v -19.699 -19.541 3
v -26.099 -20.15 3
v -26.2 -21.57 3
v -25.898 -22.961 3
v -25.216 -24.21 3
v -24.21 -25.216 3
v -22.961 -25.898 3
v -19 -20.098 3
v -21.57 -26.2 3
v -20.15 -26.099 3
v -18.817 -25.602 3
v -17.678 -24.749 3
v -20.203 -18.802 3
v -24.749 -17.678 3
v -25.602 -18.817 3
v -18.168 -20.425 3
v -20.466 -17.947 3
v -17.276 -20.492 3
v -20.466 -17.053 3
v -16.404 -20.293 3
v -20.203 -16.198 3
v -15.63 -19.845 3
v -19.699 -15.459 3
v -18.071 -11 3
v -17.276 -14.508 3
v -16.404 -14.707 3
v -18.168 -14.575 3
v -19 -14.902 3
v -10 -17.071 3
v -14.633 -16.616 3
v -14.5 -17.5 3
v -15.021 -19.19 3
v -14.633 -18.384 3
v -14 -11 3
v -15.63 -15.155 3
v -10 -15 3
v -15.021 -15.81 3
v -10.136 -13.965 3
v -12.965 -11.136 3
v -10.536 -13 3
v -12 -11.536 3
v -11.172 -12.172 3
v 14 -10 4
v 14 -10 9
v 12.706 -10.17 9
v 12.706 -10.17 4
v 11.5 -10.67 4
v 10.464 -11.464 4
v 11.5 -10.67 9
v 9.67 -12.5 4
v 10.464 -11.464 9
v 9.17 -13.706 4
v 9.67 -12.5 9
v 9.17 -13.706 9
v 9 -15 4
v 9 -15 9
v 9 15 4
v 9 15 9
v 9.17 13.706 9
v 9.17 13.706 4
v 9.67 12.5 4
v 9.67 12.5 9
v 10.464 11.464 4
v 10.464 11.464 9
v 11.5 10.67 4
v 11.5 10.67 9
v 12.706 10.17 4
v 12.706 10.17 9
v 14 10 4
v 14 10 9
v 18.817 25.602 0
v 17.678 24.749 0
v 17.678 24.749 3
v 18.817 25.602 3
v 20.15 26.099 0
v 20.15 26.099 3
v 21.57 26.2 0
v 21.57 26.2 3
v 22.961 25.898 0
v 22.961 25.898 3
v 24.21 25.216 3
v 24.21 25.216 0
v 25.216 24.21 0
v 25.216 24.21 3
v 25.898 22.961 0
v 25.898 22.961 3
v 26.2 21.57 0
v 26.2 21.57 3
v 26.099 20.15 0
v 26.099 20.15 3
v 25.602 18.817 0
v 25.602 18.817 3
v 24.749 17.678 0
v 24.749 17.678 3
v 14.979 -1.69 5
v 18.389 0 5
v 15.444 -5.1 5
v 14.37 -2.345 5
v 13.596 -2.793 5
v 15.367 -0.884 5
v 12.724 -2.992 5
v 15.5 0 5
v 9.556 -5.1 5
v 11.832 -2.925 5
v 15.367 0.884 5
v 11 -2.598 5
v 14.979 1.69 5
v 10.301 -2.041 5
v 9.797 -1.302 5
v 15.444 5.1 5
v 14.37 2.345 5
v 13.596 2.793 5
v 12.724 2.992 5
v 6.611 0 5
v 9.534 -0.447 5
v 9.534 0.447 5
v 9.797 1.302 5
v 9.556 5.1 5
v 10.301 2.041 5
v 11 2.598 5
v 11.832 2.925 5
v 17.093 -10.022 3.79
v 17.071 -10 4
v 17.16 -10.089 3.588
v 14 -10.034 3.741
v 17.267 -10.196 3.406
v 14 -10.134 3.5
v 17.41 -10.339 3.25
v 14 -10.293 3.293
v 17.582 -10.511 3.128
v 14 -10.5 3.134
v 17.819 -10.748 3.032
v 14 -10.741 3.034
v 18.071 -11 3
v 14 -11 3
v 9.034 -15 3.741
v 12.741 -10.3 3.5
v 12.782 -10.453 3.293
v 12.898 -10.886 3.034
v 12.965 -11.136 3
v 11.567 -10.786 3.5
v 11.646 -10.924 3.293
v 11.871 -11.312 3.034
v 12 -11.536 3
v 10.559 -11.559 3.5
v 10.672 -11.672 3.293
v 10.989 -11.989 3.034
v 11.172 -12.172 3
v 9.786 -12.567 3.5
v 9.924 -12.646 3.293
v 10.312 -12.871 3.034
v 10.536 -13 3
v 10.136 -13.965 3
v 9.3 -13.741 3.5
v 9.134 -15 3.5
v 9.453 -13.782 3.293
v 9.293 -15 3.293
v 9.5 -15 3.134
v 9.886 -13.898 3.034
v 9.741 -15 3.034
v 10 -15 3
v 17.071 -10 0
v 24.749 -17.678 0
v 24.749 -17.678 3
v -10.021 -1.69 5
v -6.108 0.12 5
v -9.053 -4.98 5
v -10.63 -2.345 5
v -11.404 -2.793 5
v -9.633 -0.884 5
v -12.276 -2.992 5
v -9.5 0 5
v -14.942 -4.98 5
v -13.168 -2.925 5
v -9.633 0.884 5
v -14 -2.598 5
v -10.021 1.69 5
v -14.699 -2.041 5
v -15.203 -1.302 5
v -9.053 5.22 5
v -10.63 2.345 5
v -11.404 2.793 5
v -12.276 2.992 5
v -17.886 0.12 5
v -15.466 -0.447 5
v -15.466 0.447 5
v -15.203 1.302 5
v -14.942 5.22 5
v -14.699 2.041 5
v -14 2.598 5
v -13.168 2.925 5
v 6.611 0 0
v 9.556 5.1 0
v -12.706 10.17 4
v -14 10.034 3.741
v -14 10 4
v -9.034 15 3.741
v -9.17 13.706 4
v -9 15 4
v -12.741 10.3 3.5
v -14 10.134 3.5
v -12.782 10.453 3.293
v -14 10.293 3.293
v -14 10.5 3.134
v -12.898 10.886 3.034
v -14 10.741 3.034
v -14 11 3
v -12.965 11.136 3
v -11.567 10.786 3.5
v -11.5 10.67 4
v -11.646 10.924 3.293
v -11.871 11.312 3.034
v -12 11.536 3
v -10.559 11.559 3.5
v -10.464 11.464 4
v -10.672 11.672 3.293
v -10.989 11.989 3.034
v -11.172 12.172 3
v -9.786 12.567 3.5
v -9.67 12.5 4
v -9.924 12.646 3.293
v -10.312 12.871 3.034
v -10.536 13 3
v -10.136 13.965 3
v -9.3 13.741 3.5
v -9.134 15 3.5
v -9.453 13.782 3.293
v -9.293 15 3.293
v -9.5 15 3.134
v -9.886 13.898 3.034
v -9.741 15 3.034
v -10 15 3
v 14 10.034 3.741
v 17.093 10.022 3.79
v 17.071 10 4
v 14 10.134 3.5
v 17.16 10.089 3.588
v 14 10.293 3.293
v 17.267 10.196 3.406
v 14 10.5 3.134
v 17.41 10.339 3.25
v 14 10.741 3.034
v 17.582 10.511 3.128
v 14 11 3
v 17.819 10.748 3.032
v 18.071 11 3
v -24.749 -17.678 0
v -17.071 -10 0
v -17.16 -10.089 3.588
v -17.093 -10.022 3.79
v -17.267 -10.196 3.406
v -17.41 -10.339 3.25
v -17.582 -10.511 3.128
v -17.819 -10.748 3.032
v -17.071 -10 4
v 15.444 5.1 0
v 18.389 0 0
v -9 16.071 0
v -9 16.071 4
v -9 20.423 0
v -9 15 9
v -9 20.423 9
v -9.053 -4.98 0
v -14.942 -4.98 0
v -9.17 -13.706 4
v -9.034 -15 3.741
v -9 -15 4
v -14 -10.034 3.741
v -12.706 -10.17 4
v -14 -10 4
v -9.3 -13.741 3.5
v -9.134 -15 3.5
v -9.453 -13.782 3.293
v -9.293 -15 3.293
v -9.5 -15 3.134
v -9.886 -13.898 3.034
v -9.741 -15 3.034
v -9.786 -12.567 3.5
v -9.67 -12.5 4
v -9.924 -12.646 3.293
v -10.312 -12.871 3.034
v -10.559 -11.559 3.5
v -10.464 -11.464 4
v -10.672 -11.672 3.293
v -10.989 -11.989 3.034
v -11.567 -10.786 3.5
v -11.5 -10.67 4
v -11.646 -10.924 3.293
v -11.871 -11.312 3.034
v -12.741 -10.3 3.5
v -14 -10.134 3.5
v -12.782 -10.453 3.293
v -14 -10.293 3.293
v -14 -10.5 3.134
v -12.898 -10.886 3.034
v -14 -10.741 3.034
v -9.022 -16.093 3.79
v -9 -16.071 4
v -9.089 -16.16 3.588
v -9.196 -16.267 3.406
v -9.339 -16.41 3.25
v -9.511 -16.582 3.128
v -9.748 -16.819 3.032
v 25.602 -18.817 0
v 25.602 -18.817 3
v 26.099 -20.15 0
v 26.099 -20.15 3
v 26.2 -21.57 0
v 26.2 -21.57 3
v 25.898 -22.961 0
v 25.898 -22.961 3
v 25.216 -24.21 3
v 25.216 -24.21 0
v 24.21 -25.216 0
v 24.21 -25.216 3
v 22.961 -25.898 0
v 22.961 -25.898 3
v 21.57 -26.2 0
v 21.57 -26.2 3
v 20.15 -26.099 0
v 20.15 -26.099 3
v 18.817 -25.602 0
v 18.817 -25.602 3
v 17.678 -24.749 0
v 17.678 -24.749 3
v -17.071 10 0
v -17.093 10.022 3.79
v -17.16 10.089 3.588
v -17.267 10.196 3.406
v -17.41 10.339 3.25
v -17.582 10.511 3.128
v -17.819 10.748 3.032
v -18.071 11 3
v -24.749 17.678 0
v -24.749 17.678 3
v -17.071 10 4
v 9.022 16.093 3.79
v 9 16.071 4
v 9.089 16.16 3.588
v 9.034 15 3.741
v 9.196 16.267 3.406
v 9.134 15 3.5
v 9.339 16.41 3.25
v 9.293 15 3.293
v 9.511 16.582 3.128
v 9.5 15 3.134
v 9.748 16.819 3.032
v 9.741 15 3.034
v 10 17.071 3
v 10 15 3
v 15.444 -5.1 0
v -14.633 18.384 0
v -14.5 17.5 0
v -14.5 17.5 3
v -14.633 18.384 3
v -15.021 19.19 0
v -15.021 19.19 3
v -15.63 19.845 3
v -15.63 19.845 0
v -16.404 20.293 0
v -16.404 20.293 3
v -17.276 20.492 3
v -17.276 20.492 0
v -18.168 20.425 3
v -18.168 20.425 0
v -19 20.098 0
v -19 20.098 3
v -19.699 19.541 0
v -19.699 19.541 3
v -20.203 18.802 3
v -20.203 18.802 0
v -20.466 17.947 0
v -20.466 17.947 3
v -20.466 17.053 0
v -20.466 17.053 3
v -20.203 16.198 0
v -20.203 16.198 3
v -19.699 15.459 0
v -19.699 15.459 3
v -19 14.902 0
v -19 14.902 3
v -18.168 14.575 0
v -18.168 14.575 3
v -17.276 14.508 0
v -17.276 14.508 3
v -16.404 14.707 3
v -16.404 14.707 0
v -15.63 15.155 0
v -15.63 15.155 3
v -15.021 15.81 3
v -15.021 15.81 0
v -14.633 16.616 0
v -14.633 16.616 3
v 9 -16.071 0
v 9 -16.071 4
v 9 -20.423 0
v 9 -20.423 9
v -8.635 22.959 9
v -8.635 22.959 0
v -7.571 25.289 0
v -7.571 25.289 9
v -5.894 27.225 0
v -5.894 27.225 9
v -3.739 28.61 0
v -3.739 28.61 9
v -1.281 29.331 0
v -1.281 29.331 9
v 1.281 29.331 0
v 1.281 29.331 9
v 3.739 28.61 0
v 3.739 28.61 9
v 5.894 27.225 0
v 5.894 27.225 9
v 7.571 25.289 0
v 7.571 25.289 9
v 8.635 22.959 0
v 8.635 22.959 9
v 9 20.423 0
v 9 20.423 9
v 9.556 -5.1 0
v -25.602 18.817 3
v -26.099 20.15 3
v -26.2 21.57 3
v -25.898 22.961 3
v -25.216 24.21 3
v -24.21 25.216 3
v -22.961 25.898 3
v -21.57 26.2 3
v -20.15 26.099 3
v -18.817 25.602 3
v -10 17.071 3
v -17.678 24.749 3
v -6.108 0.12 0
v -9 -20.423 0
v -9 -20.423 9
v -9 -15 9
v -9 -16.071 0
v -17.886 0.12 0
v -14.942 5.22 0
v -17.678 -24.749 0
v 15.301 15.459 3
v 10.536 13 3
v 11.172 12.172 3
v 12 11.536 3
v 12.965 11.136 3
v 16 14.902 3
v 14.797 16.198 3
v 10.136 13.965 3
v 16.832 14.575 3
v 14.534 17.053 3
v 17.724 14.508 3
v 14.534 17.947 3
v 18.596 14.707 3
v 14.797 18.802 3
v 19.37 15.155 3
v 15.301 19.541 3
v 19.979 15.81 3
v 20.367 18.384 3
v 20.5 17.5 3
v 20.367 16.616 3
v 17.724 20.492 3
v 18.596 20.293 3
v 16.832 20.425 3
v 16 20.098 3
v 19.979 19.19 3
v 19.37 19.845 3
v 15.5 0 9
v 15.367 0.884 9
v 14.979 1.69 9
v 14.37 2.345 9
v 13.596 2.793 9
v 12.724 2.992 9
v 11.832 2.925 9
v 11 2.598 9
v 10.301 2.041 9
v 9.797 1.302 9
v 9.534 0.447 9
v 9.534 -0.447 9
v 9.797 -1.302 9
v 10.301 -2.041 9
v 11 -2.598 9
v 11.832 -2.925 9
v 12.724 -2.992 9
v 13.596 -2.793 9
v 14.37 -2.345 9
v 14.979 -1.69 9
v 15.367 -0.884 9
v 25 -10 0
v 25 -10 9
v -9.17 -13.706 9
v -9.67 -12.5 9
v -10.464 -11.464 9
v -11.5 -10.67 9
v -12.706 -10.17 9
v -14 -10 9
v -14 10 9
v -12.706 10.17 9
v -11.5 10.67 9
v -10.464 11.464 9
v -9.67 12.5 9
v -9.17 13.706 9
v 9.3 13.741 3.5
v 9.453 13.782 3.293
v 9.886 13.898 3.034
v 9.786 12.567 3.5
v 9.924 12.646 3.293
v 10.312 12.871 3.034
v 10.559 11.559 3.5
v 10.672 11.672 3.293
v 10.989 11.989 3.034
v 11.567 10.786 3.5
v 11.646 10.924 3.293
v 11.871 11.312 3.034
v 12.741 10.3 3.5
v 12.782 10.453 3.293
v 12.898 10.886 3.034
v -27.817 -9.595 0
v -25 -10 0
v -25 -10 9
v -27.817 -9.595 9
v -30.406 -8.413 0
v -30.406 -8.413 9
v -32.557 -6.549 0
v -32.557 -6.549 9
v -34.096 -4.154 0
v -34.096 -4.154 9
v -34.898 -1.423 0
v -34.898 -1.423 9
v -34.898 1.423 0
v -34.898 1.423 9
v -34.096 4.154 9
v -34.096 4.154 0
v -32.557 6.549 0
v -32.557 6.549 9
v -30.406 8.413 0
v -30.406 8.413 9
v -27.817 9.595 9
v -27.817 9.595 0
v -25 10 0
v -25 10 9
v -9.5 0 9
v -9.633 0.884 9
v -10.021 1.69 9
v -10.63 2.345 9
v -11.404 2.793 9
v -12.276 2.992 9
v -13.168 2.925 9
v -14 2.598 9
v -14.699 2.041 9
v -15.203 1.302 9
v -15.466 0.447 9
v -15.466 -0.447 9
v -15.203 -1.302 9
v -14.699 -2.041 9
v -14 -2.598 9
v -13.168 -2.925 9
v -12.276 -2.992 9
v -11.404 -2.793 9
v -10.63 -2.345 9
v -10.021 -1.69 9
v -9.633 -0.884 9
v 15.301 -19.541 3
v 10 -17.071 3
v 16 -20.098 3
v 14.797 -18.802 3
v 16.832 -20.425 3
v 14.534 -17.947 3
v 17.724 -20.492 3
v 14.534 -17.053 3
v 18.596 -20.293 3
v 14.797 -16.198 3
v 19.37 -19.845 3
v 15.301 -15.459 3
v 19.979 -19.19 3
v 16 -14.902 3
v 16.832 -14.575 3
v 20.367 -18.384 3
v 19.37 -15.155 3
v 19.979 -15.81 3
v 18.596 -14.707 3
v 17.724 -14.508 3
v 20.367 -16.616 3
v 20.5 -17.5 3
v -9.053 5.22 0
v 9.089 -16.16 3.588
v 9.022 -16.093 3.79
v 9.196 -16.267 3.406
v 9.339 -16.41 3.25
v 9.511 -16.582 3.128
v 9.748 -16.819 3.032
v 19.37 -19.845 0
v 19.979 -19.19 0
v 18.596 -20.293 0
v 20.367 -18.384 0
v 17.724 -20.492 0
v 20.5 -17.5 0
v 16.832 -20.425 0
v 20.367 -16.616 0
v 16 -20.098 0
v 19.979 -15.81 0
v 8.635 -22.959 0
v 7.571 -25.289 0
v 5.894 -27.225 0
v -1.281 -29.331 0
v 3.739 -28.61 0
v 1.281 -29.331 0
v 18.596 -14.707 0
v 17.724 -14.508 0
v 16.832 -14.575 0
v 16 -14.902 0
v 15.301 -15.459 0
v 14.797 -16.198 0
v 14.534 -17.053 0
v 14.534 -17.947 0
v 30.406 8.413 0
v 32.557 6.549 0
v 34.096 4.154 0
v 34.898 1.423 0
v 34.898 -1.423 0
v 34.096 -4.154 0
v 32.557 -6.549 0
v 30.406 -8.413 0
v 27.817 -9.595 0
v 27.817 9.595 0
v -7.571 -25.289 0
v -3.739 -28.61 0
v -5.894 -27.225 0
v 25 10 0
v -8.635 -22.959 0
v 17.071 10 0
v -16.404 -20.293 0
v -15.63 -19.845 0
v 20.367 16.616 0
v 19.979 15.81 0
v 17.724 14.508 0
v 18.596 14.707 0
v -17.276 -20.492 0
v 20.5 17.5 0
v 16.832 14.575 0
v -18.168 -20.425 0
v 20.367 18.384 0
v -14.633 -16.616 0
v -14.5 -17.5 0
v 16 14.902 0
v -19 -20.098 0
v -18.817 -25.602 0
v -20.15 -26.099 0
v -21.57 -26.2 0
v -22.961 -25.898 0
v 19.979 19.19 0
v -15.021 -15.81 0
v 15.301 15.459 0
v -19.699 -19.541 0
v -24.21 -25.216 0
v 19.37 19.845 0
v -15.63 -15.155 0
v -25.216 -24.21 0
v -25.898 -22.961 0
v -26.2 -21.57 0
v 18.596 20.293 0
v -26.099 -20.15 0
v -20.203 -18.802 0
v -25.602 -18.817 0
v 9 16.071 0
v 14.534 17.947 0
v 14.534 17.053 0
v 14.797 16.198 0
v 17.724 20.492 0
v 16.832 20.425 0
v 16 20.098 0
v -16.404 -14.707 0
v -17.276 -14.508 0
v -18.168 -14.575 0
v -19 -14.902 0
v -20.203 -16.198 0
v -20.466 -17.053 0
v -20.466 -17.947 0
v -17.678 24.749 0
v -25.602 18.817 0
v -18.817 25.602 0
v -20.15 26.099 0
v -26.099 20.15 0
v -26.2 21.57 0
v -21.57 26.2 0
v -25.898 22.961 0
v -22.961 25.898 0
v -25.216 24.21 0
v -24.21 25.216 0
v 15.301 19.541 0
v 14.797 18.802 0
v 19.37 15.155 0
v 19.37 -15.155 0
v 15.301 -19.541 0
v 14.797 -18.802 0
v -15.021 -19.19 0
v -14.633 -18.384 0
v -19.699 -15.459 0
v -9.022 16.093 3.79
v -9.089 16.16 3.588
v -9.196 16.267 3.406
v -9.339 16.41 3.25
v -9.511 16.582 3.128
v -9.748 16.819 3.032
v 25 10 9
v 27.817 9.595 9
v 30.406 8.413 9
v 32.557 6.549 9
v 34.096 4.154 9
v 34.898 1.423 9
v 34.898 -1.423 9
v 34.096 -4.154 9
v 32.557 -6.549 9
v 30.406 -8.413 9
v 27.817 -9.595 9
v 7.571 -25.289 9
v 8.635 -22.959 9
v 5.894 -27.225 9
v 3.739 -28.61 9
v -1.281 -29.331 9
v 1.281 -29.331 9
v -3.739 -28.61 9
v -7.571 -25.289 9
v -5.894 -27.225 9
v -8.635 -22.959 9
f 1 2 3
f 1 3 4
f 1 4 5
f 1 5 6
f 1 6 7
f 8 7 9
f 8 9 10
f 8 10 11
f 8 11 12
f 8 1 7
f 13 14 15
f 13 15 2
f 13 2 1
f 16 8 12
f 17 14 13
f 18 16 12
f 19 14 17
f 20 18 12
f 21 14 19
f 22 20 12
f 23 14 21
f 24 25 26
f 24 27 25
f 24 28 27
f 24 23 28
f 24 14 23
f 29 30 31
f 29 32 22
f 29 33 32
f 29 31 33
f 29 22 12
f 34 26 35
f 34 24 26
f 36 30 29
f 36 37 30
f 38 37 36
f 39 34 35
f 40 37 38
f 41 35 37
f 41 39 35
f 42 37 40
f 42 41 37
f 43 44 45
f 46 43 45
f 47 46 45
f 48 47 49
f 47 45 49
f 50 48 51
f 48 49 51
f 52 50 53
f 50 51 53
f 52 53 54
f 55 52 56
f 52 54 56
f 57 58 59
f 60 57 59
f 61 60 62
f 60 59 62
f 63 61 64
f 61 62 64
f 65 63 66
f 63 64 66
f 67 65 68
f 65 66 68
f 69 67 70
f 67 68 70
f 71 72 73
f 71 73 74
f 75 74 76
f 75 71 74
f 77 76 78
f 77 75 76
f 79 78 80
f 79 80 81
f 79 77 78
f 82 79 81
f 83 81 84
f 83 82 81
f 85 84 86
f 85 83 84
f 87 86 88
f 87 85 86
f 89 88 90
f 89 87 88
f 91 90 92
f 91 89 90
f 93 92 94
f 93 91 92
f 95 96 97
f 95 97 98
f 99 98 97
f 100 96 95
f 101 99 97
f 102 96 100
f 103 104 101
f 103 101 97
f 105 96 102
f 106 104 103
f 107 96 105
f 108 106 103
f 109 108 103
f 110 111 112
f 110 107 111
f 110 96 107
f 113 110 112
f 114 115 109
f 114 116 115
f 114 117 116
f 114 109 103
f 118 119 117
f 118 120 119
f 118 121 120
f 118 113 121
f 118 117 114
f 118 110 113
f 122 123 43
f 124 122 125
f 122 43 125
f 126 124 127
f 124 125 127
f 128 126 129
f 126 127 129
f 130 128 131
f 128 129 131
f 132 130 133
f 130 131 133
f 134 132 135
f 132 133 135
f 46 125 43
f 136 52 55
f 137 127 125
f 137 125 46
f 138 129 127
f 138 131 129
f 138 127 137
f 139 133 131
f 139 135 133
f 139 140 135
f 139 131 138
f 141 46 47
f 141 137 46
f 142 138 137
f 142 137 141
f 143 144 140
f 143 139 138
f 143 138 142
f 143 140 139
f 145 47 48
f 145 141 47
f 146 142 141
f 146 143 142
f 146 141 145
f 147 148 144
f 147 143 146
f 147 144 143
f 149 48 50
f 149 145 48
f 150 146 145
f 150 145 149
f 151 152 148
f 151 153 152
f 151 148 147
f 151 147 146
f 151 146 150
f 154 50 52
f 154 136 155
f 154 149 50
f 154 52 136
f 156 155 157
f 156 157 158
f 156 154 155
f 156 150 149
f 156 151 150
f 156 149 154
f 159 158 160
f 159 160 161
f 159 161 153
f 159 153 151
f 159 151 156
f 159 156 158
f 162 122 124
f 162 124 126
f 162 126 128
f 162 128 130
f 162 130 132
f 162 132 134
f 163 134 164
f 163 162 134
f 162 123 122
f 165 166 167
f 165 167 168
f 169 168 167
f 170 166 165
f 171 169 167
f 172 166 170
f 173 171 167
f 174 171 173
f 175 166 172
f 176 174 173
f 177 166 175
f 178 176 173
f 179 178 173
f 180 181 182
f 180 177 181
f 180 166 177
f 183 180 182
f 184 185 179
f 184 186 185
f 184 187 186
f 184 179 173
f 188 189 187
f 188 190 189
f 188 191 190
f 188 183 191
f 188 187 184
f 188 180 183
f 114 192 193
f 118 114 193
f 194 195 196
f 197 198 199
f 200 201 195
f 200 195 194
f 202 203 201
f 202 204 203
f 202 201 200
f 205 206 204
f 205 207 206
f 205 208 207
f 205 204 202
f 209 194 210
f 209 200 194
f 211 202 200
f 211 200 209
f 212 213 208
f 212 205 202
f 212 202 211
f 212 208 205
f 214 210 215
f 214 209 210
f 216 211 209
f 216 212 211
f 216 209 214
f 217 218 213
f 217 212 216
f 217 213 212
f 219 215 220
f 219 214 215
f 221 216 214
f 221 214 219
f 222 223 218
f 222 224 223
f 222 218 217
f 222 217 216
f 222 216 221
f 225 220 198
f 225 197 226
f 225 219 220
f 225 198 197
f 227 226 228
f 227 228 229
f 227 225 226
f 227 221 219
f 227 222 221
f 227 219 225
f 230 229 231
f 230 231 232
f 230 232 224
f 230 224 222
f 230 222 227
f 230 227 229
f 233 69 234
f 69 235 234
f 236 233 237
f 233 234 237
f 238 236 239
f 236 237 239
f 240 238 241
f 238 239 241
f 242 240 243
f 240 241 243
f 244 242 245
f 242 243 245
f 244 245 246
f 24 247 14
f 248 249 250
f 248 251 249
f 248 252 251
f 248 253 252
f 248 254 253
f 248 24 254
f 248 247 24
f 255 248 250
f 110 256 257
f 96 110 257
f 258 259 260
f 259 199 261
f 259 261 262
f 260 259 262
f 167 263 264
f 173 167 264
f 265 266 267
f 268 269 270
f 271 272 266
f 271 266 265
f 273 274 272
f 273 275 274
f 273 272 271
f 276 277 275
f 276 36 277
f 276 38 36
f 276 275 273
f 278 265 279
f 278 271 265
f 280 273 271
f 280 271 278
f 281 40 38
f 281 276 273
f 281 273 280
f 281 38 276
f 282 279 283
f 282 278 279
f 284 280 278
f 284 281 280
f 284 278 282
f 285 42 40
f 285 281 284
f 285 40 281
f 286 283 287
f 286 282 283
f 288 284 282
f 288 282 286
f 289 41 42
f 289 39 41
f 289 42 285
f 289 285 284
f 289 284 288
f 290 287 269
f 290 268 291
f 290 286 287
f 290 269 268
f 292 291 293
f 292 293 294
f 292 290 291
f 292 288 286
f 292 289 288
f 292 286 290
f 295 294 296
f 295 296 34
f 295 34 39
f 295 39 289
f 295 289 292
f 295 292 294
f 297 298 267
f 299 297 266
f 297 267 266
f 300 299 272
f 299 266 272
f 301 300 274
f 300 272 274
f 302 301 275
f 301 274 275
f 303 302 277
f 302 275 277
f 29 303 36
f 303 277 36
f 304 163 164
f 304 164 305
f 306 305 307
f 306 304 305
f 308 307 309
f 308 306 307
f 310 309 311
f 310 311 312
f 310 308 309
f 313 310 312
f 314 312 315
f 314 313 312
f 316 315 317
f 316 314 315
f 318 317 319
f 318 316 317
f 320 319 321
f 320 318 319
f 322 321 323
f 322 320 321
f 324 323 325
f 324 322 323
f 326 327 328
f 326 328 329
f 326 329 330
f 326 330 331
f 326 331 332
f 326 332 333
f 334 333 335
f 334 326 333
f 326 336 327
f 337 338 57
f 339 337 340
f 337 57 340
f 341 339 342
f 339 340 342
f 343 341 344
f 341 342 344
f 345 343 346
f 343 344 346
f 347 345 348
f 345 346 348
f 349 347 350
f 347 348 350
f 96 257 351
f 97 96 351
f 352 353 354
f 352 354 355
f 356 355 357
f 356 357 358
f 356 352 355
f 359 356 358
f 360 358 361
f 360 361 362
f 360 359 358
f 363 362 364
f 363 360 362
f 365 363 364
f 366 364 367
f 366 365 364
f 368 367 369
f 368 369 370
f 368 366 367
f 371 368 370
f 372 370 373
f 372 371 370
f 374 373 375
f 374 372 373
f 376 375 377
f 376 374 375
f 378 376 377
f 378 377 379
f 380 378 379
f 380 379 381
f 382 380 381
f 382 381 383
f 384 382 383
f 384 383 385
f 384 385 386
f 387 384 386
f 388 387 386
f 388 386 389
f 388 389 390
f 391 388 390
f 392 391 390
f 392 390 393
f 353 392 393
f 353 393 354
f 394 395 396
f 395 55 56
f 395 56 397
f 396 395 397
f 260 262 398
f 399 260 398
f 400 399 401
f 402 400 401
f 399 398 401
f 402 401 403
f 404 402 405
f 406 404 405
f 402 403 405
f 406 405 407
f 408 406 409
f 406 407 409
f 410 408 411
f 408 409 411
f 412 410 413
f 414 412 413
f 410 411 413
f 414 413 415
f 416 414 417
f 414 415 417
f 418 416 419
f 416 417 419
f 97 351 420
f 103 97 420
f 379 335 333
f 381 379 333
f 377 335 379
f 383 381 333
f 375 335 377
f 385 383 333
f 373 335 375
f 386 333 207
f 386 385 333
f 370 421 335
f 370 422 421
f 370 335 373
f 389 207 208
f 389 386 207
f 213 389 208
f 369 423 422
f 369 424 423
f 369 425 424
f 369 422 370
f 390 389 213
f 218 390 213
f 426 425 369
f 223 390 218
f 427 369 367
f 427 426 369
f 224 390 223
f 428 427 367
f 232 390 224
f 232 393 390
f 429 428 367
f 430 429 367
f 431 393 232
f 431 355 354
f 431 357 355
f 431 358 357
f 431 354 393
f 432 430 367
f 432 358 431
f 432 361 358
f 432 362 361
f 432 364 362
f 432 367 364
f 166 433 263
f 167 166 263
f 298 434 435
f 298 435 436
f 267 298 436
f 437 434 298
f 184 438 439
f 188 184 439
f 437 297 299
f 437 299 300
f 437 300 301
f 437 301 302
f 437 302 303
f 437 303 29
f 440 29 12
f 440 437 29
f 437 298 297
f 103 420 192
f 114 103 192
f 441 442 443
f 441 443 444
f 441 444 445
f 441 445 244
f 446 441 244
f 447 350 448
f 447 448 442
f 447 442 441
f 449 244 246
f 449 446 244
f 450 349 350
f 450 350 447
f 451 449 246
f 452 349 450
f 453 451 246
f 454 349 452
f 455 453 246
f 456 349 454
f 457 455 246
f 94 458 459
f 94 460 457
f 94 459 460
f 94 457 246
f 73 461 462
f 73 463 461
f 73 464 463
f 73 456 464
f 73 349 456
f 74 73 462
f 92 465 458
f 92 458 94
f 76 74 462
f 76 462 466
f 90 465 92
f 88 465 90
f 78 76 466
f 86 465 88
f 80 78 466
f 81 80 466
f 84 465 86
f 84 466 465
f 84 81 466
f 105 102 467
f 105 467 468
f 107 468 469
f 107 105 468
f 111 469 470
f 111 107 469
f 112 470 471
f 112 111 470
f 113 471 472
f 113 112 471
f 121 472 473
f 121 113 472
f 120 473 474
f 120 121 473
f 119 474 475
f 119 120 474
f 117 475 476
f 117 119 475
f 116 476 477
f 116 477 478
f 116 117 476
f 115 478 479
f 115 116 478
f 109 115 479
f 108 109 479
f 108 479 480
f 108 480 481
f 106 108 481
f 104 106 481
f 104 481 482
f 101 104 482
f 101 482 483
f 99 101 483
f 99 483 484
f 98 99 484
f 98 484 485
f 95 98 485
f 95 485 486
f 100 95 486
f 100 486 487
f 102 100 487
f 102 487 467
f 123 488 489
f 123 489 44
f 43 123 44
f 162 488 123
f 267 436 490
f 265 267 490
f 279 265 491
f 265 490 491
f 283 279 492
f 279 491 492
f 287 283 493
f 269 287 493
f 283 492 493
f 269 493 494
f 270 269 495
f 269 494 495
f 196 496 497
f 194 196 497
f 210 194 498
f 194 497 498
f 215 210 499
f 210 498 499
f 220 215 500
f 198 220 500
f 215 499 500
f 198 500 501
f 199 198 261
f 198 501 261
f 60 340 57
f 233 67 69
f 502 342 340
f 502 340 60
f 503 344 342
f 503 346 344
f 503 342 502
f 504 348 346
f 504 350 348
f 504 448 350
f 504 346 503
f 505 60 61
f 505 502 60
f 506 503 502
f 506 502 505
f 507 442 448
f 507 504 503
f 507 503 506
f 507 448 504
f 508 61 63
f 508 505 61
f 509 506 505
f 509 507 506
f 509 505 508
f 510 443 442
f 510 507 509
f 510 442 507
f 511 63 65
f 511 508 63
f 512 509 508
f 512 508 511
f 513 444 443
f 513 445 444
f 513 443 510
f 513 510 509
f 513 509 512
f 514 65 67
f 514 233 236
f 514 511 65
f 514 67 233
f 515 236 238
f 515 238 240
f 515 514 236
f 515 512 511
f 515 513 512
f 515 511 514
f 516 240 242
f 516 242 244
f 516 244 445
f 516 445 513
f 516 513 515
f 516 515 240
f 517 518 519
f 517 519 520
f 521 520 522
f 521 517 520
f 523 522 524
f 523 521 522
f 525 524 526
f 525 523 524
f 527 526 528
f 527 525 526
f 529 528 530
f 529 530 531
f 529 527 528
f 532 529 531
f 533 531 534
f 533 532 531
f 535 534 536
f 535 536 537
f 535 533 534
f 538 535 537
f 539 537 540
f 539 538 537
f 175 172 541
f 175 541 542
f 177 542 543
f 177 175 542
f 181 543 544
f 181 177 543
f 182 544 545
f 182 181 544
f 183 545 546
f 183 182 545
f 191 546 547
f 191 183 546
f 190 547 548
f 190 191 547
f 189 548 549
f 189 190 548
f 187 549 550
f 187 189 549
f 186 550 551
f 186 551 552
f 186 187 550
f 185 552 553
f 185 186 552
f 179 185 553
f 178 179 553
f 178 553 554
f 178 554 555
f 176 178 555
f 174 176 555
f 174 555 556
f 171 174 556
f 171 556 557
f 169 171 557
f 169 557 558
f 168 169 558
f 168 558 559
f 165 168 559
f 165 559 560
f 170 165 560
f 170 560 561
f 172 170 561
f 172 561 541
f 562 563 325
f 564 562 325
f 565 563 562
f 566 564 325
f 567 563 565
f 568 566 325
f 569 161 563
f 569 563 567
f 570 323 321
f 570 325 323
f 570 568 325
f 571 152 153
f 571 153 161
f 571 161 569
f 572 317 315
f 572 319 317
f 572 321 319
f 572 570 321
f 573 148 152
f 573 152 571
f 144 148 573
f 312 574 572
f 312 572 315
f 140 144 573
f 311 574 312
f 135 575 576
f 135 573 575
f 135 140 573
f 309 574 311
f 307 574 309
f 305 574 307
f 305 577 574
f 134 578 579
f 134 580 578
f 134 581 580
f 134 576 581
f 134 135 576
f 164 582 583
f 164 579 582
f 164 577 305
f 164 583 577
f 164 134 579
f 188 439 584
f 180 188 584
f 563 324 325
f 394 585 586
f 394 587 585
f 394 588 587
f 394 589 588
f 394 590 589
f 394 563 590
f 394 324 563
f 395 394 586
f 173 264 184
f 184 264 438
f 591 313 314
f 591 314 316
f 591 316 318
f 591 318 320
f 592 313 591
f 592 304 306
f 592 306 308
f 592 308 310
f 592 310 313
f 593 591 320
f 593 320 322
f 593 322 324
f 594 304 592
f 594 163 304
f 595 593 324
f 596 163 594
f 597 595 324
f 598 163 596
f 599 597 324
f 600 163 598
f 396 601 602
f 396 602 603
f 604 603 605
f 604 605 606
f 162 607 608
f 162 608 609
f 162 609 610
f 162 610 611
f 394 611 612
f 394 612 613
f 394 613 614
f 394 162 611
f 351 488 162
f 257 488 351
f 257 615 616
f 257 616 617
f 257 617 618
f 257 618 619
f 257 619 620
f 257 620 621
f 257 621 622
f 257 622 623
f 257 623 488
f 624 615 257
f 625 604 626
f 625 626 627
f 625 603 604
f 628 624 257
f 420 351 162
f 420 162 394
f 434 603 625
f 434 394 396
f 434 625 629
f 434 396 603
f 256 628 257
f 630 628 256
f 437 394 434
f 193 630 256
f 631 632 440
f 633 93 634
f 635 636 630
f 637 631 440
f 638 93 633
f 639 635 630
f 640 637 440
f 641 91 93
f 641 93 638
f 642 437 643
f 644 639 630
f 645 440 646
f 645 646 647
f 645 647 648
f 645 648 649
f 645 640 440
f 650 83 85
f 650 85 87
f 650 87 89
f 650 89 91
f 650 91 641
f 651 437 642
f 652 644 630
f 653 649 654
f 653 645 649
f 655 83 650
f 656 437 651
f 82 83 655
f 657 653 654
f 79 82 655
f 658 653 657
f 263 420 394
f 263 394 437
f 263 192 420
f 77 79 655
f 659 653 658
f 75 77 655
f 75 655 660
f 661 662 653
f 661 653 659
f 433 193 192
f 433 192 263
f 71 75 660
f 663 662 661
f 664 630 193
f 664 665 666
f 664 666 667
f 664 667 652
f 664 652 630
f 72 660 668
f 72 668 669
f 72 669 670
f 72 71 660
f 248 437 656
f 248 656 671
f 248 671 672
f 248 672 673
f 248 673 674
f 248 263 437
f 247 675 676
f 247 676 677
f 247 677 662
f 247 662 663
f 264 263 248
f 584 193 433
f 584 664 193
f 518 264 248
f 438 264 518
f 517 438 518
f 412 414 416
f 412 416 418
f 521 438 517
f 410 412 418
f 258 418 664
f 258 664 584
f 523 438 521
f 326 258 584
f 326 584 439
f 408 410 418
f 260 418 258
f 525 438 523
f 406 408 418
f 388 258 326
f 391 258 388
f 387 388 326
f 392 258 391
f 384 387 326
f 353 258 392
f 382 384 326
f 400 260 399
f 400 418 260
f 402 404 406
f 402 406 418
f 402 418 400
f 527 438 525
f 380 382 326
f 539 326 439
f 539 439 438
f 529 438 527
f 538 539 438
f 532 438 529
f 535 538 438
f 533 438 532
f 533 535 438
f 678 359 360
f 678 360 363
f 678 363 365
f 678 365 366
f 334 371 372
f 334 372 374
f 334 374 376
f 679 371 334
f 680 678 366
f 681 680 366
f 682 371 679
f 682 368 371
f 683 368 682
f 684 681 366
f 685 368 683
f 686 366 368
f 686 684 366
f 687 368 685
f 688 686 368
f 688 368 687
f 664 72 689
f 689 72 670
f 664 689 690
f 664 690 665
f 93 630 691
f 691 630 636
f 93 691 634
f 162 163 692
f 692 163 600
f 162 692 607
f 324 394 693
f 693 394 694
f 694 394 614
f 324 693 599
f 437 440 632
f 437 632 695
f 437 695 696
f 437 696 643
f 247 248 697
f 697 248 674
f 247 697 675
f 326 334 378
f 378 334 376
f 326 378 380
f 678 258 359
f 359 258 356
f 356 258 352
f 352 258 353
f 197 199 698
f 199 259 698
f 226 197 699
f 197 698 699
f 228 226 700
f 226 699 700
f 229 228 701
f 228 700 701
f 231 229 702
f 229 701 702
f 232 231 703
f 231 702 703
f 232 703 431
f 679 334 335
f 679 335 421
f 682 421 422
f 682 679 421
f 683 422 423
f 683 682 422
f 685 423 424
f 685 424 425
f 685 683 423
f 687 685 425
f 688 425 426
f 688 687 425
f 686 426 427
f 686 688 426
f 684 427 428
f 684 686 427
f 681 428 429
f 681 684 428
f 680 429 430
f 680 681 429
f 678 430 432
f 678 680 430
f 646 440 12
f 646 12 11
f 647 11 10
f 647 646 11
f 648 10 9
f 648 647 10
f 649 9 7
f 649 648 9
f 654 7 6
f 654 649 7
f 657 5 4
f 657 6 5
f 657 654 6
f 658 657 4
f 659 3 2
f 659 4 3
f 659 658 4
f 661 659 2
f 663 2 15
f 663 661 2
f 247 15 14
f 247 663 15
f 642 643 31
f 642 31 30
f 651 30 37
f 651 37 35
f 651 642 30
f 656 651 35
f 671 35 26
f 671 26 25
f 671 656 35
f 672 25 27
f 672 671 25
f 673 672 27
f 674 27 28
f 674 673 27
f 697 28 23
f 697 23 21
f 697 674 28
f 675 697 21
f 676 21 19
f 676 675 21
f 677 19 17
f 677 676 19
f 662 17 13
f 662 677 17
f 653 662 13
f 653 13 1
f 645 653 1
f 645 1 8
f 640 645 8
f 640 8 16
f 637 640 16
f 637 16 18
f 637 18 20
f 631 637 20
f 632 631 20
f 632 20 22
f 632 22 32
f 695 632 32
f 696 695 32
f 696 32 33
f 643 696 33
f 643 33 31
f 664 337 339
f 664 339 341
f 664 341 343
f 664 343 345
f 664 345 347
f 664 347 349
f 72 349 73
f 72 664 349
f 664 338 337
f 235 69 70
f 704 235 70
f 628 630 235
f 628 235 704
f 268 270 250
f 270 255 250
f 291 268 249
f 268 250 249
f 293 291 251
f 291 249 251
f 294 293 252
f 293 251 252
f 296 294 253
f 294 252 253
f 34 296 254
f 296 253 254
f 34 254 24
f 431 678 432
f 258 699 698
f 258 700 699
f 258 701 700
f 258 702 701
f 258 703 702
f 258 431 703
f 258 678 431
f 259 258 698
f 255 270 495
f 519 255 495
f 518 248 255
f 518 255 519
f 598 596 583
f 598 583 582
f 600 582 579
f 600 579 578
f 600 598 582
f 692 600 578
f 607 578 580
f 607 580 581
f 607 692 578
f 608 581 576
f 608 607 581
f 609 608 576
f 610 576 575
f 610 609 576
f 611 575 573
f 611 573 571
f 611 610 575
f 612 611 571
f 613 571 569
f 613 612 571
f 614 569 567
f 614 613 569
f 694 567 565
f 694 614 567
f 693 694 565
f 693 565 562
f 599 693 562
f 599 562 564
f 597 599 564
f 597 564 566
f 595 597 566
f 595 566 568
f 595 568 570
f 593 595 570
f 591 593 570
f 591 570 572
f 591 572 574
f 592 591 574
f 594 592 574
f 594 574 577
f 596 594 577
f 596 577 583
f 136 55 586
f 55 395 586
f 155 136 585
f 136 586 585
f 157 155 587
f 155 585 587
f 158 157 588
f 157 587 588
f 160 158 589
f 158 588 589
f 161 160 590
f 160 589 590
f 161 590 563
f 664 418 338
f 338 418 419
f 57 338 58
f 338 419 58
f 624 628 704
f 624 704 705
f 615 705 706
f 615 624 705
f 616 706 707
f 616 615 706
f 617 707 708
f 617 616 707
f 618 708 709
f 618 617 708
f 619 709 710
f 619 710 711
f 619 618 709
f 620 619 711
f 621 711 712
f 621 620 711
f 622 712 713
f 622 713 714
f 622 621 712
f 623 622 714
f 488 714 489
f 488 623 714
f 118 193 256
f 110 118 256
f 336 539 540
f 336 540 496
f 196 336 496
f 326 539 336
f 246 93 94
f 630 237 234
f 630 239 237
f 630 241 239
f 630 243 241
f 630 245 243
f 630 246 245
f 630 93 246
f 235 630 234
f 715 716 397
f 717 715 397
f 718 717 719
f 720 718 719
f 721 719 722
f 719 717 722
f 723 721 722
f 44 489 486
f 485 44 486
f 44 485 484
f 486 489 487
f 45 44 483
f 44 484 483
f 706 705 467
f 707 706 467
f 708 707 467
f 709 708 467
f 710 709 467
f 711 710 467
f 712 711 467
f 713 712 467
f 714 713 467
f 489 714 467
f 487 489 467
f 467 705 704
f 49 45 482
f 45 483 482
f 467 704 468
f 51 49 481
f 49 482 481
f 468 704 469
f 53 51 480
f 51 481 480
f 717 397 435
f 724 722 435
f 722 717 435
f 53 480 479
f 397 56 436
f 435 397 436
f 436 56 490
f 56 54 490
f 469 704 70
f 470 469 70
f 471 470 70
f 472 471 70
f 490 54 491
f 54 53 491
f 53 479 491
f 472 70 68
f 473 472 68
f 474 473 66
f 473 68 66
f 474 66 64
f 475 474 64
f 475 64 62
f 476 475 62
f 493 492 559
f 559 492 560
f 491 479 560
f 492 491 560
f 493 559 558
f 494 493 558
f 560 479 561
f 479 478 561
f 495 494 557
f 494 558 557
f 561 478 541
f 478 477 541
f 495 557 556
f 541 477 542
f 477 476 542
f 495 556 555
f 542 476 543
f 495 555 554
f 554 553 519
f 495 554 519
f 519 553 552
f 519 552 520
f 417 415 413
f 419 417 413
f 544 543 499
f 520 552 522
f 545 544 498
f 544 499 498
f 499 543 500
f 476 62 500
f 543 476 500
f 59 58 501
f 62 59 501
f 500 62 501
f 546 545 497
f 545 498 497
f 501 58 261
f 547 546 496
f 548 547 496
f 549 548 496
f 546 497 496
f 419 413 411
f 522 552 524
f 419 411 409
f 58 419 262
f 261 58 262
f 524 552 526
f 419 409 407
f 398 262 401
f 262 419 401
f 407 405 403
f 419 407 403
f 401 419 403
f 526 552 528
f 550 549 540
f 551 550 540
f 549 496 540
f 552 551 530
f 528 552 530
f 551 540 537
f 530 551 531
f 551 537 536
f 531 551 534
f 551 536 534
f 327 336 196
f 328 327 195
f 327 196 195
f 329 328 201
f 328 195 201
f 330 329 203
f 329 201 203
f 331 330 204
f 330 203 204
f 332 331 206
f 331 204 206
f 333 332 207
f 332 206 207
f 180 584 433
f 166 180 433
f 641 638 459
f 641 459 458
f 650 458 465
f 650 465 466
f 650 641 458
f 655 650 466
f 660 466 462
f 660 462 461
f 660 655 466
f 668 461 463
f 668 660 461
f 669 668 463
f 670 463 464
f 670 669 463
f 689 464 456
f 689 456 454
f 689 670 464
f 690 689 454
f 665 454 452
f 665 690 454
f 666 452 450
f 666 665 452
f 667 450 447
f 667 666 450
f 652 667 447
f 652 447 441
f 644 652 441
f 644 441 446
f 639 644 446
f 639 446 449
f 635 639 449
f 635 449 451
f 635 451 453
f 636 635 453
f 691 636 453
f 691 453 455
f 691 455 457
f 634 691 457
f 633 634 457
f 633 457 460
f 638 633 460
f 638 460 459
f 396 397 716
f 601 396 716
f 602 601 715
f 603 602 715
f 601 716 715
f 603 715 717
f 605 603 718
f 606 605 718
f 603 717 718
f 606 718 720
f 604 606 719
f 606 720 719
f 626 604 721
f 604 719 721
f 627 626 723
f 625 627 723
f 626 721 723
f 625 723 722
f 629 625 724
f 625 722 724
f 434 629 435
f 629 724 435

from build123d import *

# Parameters (mm, degrees)
SKETCH1_R           = 3
BOSS_EXTRUDE2_DEPTH = 9
BOSS_EXTRUDE3_DEPTH = 9
CUT_EXTRUDE4_DEPTH  = 5
CUT_EXTRUDE5_START  = -6
SKETCH4_R           = 3
CUT_EXTRUDE5_DEPTH  = 6
FILLET1_R           = 5
FILLET2_R           = 1


with BuildPart() as part:
    # Sketch1 → Boss-Extrude2 (new body)
    # profile 1 of 3: a face of its own
    with BuildSketch(Plane.XY):
        with BuildLine():
            Line((17.67766953, -24.748737342), (-24.748737342, 17.67766953))
            ThreePointArc((-24.748737342, 17.67766953), (-24.748737342, 24.748737342), (-17.67766953, 24.748737342))
            Line((-17.67766953, 24.748737342), (24.748737342, -17.67766953))
            ThreePointArc((24.748737342, -17.67766953), (24.748737342, -24.748737342), (17.67766953, -24.748737342))
        make_face()
        with Locations((-17.5, 17.5)):
            Circle(SKETCH1_R, mode=Mode.SUBTRACT)
        with Locations((17.5, -17.5)):
            Circle(SKETCH1_R, mode=Mode.SUBTRACT)
    # profile 2 of 3: a face of its own
    with BuildSketch(Plane.XY):
        with BuildLine():
            Line((-24.748737342, -17.67766953), (17.67766953, 24.748737342))
            ThreePointArc((17.67766953, 24.748737342), (24.748737342, 24.748737342), (24.748737342, 17.67766953))
            Line((24.748737342, 17.67766953), (-17.67766953, -24.748737342))
            ThreePointArc((-17.67766953, -24.748737342), (-24.748737342, -24.748737342), (-24.748737342, -17.67766953))
        make_face()
        with Locations((17.5, 17.5)):
            Circle(SKETCH1_R, mode=Mode.SUBTRACT)
        with Locations((-17.5, -17.5)):
            Circle(SKETCH1_R, mode=Mode.SUBTRACT)
    # profile 3 of 3: a face of its own
    with BuildSketch(Plane.XY):
        with BuildLine():
            Line((-25, 10), (25, 10))
            ThreePointArc((25, 10), (35, 0), (25, -10))
            Line((25, -10), (-25, -10))
            ThreePointArc((-25, -10), (-35, 0), (-25, 10))
        make_face()
        with Locations((12.5, 0)):
            Circle(SKETCH1_R, mode=Mode.SUBTRACT)
        with Locations((-12.5, 0)):
            Circle(SKETCH1_R, mode=Mode.SUBTRACT)
    extrude(amount=BOSS_EXTRUDE2_DEPTH)

    # Sketch5 → Boss-Extrude3 (add)
    with BuildSketch(Plane.XY.offset(9)):
        with BuildLine():
            Line((9, 20.422973397), (9, -20.422973397))
            ThreePointArc((9, -20.422973397), (0, -29.422973397), (-9, -20.422973397))
            Line((-9, -20.422973397), (-9, 20.422973397))
            ThreePointArc((-9, 20.422973397), (0, 29.422973397), (9, 20.422973397))
        make_face()
    extrude(amount=-BOSS_EXTRUDE3_DEPTH)

    # Sketch6 → Cut-Extrude4 (cut)
    with BuildSketch(Plane(origin=(0, 0, 0), x_dir=(-1, 0, 0), z_dir=(0, 0, -1))):
        Polygon((-6.611027254, 0), (-9.555513627, 5.1), (-15.444486373, 5.1), (-18.388972746, 0), (-15.444486373, -5.1), (-9.555513627, -5.1), align=None)
        Polygon((17.886314115, 0.120263137), (14.941827742, 5.220263137), (9.052854996, 5.220263137), (6.108368623, 0.120263137), (9.052854996, -4.979736863), (14.941827742, -4.979736863), align=None)
    extrude(amount=-CUT_EXTRUDE4_DEPTH, mode=Mode.SUBTRACT)

    # Sketch4 → Cut-Extrude5 (cut)
    # profile 1 of 8: a face of its own
    with BuildSketch(Plane.XY.offset(9).offset(CUT_EXTRUDE5_START)):
        with BuildLine():
            Line((-9, 26.683350041), (-29.894469541, 26.683350041))
            Line((-29.894469541, 26.683350041), (-29.894469541, 10))
            Line((-29.894469541, 10), (-25, 10))
            Line((-25, 10), (-17.071067812, 10))
            Line((-17.071067812, 10), (-24.748737342, 17.67766953))
            ThreePointArc((-24.748737342, 17.67766953), (-24.748737342, 24.748737342), (-17.67766953, 24.748737342))
            Line((-17.67766953, 24.748737342), (-9, 16.071067812))
            Line((-9, 16.071067812), (-9, 20.422973397))
            Line((-9, 20.422973397), (-9, 26.683350041))
        make_face()
    # profile 2 of 8: a face of its own
    with BuildSketch(Plane.XY.offset(9).offset(CUT_EXTRUDE5_START)):
        with BuildLine():
            Line((-9, 10), (-9, 16.071067812))
            Line((-9, 16.071067812), (-17.67766953, 24.748737342))
            ThreePointArc((-17.67766953, 24.748737342), (-24.748737342, 24.748737342), (-24.748737342, 17.67766953))
            Line((-24.748737342, 17.67766953), (-17.071067812, 10))
            Line((-17.071067812, 10), (-9, 10))
        make_face()
        with Locations((-17.5, 17.5)):
            Circle(SKETCH4_R, mode=Mode.SUBTRACT)
    # profile 3 of 8: a face of its own
    with BuildSketch(Plane.XY.offset(9).offset(CUT_EXTRUDE5_START)):
        with BuildLine():
            Line((25, 10), (29.894469541, 10))
            Line((29.894469541, 10), (29.894469541, 26.683350041))
            Line((29.894469541, 26.683350041), (9, 26.683350041))
            Line((9, 26.683350041), (9, 20.422973397))
            Line((9, 20.422973397), (9, 16.071067812))
            Line((9, 16.071067812), (17.67766953, 24.748737342))
            ThreePointArc((17.67766953, 24.748737342), (24.748737342, 24.748737342), (24.748737342, 17.67766953))
            Line((24.748737342, 17.67766953), (17.071067812, 10))
            Line((17.071067812, 10), (25, 10))
        make_face()
    # profile 4 of 8: a face of its own
    with BuildSketch(Plane.XY.offset(9).offset(CUT_EXTRUDE5_START)):
        with BuildLine():
            Line((9, 10), (17.071067812, 10))
            Line((17.071067812, 10), (24.748737342, 17.67766953))
            ThreePointArc((24.748737342, 17.67766953), (24.748737342, 24.748737342), (17.67766953, 24.748737342))
            Line((17.67766953, 24.748737342), (9, 16.071067812))
            Line((9, 16.071067812), (9, 10))
        make_face()
        with Locations((17.5, 17.5)):
            Circle(SKETCH4_R, mode=Mode.SUBTRACT)
    # profile 5 of 8: a face of its own
    with BuildSketch(Plane.XY.offset(9).offset(CUT_EXTRUDE5_START)):
        with BuildLine():
            Line((9, -26.683350041), (29.894469541, -26.683350041))
            Line((29.894469541, -26.683350041), (29.894469541, -10))
            Line((29.894469541, -10), (25, -10))
            Line((25, -10), (17.071067812, -10))
            Line((17.071067812, -10), (24.748737342, -17.67766953))
            ThreePointArc((24.748737342, -17.67766953), (24.748737342, -24.748737342), (17.67766953, -24.748737342))
            Line((17.67766953, -24.748737342), (9, -16.071067812))
            Line((9, -16.071067812), (9, -20.422973397))
            Line((9, -20.422973397), (9, -26.683350041))
        make_face()
    # profile 6 of 8: a face of its own
    with BuildSketch(Plane.XY.offset(9).offset(CUT_EXTRUDE5_START)):
        with BuildLine():
            Line((24.748737342, -17.67766953), (17.071067812, -10))
            Line((17.071067812, -10), (9, -10))
            Line((9, -10), (9, -16.071067812))
            Line((9, -16.071067812), (17.67766953, -24.748737342))
            ThreePointArc((17.67766953, -24.748737342), (24.748737342, -24.748737342), (24.748737342, -17.67766953))
        make_face()
        with Locations((17.5, -17.5)):
            Circle(SKETCH4_R, mode=Mode.SUBTRACT)
    # profile 7 of 8: a face of its own
    with BuildSketch(Plane.XY.offset(9).offset(CUT_EXTRUDE5_START)):
        with BuildLine():
            Line((-9, -10), (-17.071067812, -10))
            Line((-17.071067812, -10), (-24.748737342, -17.67766953))
            ThreePointArc((-24.748737342, -17.67766953), (-24.748737342, -24.748737342), (-17.67766953, -24.748737342))
            Line((-17.67766953, -24.748737342), (-9, -16.071067812))
            Line((-9, -16.071067812), (-9, -10))
        make_face()
        with Locations((-17.5, -17.5)):
            Circle(SKETCH4_R, mode=Mode.SUBTRACT)
    # profile 8 of 8: a face of its own
    with BuildSketch(Plane.XY.offset(9).offset(CUT_EXTRUDE5_START)):
        with BuildLine():
            Line((-25, -10), (-29.894469541, -10))
            Line((-29.894469541, -10), (-29.894469541, -26.683350041))
            Line((-29.894469541, -26.683350041), (-9, -26.683350041))
            Line((-9, -26.683350041), (-9, -20.422973397))
            Line((-9, -20.422973397), (-9, -16.071067812))
            Line((-9, -16.071067812), (-17.67766953, -24.748737342))
            ThreePointArc((-17.67766953, -24.748737342), (-24.748737342, -24.748737342), (-24.748737342, -17.67766953))
            Line((-24.748737342, -17.67766953), (-17.071067812, -10))
            Line((-17.071067812, -10), (-25, -10))
        make_face()
    extrude(amount=CUT_EXTRUDE5_DEPTH, mode=Mode.SUBTRACT)

    # Fillet1
    fillet1_edges = [part.edges().sort_by_distance(p)[0] for p in [
        (-9, -10, 6),
        (9, -10, 6),
        (9, 10, 6),
        (-9, 10, 6),
    ]]
    fillet(fillet1_edges, radius=FILLET1_R)

    # Fillet2
    fillet2_edges = [part.edges().sort_by_distance(p)[0] for p in [
        (-9, -15.535533906, 3),
        (-15.535533906, -10, 3),
        (15.535533906, -10, 3),
        (9, -15.535533906, 3),
        (9, 15.535533906, 3),
        (15.535533906, 10, 3),
        (-15.535533906, 10, 3),
        (-9, 15.535533906, 3),
        (10.464466094, 11.464466094, 3),
        (-10.464466094, 11.464466094, 3),
        (-10.464466094, -11.464466094, 3),
        (10.464466094, -11.464466094, 3),
    ]]
    fillet(fillet2_edges, radius=FILLET2_R)


solid = part.part
